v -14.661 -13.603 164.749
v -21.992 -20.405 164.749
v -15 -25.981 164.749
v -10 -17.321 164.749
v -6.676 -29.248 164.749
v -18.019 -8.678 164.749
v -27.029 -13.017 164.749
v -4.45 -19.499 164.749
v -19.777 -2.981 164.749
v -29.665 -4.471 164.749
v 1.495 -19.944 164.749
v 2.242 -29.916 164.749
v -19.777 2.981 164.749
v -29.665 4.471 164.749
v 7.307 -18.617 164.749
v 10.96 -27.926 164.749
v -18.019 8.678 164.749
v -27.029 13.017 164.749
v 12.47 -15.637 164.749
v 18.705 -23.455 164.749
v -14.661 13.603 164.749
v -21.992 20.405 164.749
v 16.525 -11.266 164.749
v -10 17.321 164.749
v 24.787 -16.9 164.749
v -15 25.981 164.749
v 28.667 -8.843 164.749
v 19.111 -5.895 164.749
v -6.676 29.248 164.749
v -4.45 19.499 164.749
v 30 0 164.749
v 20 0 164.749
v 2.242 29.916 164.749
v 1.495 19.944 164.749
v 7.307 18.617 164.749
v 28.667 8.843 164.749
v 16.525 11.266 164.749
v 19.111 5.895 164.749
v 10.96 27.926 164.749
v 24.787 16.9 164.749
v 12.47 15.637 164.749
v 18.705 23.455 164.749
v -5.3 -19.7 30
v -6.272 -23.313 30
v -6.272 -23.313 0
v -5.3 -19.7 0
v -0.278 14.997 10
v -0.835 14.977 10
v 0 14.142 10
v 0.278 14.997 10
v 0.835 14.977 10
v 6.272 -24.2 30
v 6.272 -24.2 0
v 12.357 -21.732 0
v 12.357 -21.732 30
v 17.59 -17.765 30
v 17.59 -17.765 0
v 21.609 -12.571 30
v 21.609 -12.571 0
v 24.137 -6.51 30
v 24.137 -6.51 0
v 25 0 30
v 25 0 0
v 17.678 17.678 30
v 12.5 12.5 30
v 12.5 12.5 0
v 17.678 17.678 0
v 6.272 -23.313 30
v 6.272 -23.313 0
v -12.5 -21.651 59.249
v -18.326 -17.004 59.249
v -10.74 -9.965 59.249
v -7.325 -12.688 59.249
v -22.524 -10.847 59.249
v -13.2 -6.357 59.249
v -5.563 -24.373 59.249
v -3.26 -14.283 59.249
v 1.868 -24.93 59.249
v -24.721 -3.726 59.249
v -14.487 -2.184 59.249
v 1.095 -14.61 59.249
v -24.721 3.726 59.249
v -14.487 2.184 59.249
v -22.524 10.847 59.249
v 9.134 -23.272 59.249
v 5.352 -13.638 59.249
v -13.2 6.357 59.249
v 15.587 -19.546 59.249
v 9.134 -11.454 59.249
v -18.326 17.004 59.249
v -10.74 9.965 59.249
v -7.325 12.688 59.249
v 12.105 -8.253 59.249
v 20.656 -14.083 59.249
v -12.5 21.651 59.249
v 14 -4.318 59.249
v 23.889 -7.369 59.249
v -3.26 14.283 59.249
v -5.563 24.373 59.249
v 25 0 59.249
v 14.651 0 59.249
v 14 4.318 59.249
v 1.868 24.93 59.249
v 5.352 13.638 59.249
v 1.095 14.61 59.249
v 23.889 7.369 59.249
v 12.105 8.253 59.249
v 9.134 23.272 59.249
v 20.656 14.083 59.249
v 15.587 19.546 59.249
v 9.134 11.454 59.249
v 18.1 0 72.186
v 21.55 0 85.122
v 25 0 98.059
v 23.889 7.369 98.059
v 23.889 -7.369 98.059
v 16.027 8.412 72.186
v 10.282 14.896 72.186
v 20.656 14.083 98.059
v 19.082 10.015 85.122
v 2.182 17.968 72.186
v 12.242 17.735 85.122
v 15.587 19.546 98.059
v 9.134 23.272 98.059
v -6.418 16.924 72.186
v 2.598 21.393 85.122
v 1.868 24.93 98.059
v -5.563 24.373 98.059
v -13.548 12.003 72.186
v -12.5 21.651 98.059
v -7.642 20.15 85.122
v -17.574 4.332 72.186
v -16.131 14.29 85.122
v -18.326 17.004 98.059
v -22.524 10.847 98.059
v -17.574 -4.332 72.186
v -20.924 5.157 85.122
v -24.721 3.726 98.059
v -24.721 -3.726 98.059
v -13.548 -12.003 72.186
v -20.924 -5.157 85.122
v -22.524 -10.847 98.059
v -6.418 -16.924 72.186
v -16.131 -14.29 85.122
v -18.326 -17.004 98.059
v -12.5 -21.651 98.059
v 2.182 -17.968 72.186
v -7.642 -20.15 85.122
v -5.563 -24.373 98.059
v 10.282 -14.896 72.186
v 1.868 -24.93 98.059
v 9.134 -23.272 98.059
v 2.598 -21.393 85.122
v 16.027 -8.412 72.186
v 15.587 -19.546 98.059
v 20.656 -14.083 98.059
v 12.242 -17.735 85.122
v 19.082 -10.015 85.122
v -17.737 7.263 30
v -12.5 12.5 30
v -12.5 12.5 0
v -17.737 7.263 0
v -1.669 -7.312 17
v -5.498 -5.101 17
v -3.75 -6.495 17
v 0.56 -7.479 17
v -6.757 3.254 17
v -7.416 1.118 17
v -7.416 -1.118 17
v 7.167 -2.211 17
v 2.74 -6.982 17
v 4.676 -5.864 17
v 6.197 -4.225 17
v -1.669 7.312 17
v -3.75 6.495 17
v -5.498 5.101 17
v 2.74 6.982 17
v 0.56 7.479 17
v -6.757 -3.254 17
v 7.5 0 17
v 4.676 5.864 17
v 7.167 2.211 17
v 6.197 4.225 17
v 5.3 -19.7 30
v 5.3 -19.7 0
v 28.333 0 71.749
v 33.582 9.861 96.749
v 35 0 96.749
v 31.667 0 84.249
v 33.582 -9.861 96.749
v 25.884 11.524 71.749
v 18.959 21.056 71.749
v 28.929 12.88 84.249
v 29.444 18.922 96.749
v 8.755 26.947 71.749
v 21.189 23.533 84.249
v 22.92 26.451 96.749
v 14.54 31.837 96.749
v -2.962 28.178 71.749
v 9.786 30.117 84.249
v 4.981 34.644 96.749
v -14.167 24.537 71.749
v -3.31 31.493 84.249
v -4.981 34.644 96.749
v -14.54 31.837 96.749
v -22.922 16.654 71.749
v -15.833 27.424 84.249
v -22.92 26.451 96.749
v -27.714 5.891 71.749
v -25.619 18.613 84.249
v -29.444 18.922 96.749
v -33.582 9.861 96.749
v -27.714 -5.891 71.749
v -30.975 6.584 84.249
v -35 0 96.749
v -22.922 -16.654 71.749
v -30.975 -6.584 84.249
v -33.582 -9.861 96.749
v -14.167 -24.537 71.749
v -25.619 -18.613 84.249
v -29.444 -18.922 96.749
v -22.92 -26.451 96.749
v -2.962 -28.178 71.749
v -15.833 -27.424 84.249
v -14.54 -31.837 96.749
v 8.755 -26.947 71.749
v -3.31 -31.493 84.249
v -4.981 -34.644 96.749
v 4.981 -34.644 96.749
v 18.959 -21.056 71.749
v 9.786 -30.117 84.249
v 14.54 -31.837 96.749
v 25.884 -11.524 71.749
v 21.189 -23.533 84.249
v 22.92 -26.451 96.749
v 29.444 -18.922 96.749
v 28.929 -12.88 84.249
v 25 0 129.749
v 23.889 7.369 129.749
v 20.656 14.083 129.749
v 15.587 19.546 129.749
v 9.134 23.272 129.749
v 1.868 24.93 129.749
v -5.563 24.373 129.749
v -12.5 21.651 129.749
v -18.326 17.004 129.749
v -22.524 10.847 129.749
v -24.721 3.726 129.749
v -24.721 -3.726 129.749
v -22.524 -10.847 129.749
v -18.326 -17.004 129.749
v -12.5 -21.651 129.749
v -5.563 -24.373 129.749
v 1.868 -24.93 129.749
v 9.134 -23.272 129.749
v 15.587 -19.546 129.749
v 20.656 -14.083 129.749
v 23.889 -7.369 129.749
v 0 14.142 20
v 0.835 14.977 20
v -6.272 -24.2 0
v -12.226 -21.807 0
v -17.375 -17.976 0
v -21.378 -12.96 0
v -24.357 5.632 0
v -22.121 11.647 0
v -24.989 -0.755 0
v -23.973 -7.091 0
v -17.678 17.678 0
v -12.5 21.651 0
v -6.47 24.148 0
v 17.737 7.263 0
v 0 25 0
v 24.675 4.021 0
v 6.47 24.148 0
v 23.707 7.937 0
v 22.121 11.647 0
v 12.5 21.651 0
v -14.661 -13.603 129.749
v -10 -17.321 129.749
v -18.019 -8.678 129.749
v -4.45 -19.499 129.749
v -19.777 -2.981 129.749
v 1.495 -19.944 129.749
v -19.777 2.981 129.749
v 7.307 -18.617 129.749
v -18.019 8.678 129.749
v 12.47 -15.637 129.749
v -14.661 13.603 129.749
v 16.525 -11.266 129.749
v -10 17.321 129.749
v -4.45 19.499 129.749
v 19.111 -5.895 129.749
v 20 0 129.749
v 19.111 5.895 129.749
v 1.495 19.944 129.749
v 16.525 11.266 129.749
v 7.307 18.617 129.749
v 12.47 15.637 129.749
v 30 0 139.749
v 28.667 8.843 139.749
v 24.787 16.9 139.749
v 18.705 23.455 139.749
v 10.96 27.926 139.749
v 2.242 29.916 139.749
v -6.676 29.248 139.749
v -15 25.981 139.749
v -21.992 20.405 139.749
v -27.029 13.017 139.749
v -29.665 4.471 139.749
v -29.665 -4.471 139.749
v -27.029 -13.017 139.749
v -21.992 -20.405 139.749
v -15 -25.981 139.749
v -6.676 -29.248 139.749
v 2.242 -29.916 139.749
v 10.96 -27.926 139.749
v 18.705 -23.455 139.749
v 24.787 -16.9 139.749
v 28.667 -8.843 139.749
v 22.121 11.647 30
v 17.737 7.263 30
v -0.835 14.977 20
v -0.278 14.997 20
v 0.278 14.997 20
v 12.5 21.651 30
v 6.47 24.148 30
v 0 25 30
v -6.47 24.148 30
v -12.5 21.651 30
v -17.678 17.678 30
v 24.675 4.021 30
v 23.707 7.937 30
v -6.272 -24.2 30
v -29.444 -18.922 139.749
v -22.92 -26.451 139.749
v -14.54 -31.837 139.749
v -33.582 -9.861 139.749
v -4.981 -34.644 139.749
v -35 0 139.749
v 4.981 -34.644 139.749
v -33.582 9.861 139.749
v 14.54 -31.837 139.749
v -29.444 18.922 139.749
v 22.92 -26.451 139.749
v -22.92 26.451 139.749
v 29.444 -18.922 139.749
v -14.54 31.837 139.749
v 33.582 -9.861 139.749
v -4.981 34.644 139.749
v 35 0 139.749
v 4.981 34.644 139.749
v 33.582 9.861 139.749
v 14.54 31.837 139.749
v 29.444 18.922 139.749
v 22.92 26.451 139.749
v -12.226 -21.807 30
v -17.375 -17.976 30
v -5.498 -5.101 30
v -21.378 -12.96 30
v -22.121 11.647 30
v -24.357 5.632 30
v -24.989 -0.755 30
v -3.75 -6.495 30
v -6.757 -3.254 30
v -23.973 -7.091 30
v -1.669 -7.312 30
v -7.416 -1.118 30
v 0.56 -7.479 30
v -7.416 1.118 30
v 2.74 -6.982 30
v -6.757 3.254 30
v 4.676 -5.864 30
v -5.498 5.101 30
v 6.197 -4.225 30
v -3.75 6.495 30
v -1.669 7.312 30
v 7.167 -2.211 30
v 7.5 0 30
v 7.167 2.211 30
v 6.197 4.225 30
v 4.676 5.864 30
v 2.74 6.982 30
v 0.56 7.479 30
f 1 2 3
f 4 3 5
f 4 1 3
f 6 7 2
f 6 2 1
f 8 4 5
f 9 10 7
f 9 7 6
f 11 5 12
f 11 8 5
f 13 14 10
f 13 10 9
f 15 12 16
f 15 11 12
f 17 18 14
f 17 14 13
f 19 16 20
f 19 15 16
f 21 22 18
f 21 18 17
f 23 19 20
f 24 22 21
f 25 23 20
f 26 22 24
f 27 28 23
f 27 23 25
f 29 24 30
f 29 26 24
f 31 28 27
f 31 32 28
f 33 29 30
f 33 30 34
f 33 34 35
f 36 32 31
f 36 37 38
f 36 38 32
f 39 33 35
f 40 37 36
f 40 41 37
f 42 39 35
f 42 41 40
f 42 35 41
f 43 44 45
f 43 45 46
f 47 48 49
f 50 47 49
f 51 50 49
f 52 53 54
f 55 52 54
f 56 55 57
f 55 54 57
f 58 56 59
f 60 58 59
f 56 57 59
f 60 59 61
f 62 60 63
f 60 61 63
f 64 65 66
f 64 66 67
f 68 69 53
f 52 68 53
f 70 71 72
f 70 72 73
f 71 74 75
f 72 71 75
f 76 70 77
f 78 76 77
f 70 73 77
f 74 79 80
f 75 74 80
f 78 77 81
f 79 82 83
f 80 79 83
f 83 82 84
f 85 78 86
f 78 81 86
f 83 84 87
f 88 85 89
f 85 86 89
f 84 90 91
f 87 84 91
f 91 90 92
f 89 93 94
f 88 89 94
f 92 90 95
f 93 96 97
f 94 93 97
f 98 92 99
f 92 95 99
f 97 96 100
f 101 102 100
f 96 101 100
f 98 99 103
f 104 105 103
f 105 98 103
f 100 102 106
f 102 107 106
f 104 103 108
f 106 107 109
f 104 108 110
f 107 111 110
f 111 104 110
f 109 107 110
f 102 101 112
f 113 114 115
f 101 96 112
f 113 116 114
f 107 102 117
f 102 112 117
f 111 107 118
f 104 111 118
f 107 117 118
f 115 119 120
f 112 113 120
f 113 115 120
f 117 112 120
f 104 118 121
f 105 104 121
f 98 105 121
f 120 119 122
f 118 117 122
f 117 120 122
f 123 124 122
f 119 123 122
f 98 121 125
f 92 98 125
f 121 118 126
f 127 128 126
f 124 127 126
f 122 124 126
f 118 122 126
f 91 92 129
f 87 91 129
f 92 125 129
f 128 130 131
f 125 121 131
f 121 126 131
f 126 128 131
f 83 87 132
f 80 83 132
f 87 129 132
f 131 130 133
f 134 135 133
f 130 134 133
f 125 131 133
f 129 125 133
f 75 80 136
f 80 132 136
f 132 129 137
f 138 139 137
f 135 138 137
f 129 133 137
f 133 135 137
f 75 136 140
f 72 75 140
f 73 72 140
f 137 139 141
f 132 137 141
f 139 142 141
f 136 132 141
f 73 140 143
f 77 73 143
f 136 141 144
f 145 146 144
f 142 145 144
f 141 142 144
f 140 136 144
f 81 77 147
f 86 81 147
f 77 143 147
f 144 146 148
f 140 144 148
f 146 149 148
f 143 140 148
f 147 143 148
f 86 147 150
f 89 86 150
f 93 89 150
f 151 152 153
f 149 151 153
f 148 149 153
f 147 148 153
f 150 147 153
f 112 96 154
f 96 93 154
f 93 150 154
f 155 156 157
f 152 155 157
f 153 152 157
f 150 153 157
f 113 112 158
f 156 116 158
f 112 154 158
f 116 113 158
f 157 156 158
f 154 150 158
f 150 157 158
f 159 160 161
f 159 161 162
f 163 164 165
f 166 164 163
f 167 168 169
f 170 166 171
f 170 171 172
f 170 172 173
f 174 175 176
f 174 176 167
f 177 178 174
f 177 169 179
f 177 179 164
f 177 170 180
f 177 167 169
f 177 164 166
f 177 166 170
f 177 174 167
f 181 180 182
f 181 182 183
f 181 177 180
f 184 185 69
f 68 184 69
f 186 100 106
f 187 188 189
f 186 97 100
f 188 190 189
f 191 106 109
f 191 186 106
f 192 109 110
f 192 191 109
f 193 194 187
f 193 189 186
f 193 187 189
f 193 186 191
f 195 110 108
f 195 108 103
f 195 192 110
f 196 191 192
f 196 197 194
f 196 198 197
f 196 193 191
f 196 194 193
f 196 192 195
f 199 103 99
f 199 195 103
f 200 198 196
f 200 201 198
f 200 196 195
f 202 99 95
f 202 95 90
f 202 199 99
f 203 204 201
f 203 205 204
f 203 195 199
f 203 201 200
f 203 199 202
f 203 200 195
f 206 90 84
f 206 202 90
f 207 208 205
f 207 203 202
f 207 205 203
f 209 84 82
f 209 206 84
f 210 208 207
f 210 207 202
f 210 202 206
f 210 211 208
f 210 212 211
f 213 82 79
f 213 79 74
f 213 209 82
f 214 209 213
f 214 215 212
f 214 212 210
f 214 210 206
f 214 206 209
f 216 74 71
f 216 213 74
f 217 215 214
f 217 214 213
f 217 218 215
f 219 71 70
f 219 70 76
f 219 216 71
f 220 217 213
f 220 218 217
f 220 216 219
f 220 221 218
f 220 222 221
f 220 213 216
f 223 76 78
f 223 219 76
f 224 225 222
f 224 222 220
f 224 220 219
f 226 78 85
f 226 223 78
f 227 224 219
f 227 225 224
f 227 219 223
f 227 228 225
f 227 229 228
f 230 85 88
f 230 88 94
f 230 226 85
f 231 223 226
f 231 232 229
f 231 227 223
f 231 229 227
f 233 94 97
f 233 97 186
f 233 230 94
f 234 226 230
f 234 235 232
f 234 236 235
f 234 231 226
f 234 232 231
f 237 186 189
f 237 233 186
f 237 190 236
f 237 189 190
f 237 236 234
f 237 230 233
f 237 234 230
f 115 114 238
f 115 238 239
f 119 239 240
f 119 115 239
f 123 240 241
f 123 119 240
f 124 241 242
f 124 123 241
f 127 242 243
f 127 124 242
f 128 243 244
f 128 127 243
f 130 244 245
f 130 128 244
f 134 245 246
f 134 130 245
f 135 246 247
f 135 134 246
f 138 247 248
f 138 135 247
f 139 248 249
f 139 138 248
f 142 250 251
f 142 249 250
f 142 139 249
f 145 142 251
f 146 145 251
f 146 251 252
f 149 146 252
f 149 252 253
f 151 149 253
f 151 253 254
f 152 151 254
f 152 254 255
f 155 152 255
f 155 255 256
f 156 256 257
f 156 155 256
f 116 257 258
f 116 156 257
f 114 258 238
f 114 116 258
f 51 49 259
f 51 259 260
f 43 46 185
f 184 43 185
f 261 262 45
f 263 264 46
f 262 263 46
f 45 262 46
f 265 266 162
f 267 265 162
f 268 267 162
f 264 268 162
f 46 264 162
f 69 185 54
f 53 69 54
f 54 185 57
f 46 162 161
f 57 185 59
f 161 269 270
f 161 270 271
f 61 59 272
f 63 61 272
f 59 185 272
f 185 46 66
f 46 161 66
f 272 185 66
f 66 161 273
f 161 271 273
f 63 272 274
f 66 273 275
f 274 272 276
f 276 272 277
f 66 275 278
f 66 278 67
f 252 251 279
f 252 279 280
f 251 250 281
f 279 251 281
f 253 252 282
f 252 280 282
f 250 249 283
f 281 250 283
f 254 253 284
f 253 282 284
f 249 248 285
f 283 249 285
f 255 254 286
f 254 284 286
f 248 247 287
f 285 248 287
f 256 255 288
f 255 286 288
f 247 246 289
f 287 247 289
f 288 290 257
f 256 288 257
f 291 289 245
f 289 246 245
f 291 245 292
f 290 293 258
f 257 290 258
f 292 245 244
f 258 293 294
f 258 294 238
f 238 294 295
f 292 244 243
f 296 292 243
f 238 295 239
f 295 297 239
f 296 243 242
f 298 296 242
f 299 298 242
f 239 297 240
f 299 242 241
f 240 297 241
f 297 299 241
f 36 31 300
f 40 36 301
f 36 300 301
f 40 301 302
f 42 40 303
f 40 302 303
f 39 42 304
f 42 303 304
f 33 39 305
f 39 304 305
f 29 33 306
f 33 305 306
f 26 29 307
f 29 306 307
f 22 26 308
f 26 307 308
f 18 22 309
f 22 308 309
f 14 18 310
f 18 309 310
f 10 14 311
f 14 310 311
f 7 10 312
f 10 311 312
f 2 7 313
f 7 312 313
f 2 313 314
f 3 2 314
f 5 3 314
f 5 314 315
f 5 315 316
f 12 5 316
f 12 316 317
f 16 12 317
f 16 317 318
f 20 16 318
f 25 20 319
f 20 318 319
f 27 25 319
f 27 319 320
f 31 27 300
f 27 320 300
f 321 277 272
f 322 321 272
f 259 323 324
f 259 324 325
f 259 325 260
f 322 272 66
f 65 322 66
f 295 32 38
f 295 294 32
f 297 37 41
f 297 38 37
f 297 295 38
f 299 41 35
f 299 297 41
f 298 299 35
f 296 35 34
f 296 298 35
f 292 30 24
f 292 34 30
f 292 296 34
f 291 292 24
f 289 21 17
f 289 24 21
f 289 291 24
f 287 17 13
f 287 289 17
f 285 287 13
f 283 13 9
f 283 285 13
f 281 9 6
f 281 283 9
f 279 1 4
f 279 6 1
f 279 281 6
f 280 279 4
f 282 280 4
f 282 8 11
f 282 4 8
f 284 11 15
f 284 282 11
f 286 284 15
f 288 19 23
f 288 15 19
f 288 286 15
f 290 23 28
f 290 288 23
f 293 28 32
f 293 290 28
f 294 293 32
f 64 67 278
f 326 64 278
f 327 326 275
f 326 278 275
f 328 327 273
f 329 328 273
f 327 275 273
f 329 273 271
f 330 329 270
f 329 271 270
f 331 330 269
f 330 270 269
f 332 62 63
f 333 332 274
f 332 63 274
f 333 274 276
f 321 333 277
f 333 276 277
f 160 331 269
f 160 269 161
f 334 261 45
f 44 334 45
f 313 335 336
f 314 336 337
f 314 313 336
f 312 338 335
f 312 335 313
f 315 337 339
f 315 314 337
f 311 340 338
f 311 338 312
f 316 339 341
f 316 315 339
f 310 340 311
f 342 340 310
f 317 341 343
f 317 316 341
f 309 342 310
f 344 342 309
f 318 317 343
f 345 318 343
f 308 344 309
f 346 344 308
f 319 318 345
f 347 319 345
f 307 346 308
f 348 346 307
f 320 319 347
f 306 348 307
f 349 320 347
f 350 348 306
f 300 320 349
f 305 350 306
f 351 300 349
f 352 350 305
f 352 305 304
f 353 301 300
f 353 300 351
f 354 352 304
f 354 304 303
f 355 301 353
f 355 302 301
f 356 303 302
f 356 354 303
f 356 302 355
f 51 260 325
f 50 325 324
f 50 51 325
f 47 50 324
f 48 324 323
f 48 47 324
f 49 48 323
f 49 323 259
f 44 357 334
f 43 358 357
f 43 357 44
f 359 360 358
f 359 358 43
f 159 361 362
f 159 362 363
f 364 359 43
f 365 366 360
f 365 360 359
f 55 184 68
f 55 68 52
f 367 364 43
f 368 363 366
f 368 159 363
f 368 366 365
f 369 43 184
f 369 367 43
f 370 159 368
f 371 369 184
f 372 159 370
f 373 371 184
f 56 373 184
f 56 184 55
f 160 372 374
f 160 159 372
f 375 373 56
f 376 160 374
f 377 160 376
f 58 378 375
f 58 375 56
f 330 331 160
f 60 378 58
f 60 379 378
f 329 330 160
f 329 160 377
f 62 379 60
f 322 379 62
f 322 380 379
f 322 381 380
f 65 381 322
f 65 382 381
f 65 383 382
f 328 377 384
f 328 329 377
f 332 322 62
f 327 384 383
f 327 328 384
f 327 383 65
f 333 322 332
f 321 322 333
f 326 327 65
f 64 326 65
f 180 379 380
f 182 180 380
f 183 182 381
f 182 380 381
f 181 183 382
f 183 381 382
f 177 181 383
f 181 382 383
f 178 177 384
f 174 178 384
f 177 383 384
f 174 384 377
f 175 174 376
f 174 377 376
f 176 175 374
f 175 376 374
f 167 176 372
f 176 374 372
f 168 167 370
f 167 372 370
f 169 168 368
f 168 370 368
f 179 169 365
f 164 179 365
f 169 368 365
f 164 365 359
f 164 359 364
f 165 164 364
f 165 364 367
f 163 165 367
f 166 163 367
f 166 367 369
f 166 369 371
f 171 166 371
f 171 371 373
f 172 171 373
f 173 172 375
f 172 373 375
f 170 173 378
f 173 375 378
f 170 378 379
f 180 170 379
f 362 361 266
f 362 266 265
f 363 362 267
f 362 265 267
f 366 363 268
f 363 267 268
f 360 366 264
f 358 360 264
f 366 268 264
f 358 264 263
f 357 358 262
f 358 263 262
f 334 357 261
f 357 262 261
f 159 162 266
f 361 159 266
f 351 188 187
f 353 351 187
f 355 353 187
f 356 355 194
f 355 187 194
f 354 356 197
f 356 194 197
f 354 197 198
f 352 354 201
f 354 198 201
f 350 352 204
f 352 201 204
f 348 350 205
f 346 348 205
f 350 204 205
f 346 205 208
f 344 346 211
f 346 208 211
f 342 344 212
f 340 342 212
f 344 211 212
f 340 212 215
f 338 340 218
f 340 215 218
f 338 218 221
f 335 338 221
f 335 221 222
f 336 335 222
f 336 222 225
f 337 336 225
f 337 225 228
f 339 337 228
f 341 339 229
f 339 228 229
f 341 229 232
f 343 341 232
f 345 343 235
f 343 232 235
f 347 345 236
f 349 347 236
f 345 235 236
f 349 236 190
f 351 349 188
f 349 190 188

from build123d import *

# Parameters (mm, degrees)
BOSS_EXTRUDE2_DEPTH = 30
SKETCH2_R           = 7.5
CUT_EXTRUDE1_DEPTH  = 13
SKETCH5_R           = 25
SKETCH7_R           = 35
SKETCH10_R          = 35
BOSS_EXTRUDE3_DEPTH = 43
SKETCH11_R          = 30
BOSS_EXTRUDE4_DEPTH = 25
SHELL4_T            = -10
SHELL5_START        = 10
SHELL5_DEPTH        = 10


# Read off the part's stored shape, not the designer's step: Shell5
with BuildPart() as part:
    # Sketch1 → Boss-Extrude2 (new body)
    with BuildSketch(Plane.XY):
        with BuildLine():
            Line((-17.67766953, 17.67766953), (-12.5, 12.5))
            Line((-12.5, 12.5), (-17.737217669, 7.262782331))
            Line((-17.737217669, 7.262782331), (-22.121279713, 11.646844374))
            ThreePointArc((-22.121279713, 11.646844374), (-22.864843942, -10.10934773), (-6.271925609, -24.200474151))
            Line((-6.271925609, -24.200474151), (-6.271925609, -23.312629151))
            Line((-6.271925609, -23.312629151), (-5.3, -19.7))
            Line((-5.3, -19.7), (0, -19.7))
            Line((0, -19.7), (5.3, -19.7))
            Line((5.3, -19.7), (6.271925609, -23.312629151))
            Line((6.271925609, -23.312629151), (6.271925609, -24.200474151))
            ThreePointArc((6.271925609, -24.200474151), (19.771167647, -15.300357182), (25, 0))
            ThreePointArc((25, 0), (24.269651757, 5.998666818), (22.121279713, 11.646844374))
            Line((22.121279713, 11.646844374), (17.737217669, 7.262782331))
            Line((17.737217669, 7.262782331), (12.5, 12.5))
            Line((12.5, 12.5), (17.67766953, 17.67766953))
            ThreePointArc((17.67766953, 17.67766953), (0, 25), (-17.67766953, 17.67766953))
        make_face()
    extrude(amount=BOSS_EXTRUDE2_DEPTH)

    # Sketch2 → Cut-Extrude1 (cut)
    with BuildSketch(Plane.XY.offset(30)):
        Circle(SKETCH2_R)
    extrude(amount=-CUT_EXTRUDE1_DEPTH, mode=Mode.SUBTRACT)

    # Shell5 outline → Shell5 (cut)
    with BuildSketch(Plane.XY.offset(SHELL5_START)):
        with BuildLine():
            Line((0, 14.142135624), (0.834626339, 14.976761962))
            ThreePointArc((0.834626339, 14.976761962), (0, 15), (-0.834626339, 14.976761962))
            Line((-0.834626339, 14.976761962), (0, 14.142135624))
        make_face()
    extrude(amount=SHELL5_DEPTH, mode=Mode.SUBTRACT)


with BuildPart() as body_2:
    # Sketch5 → Loft1 section 0
    with BuildSketch(Plane.XY.offset(59.248809309)):
        Circle(SKETCH5_R)
    # Sketch7 → Loft1 section 1
    with BuildSketch(Plane.XY.offset(96.748809309)):
        Circle(SKETCH7_R)
    loft()

    # Sketch10 → Boss-Extrude3 (add)
    with BuildSketch(Plane.XY.offset(96.748809309)):
        Circle(SKETCH10_R)
    extrude(amount=BOSS_EXTRUDE3_DEPTH)

    # Sketch11 → Boss-Extrude4 (add)
    with BuildSketch(Plane.XY.offset(139.748809309)):
        Circle(SKETCH11_R)
    extrude(amount=BOSS_EXTRUDE4_DEPTH)

    # Shell4
    shell4_openings = [body_2.faces().sort_by_distance(p)[0] for p in [
        (0, 0, 164.748809309),
        (0, 0, 59.248809309),
    ]]
    offset(amount=SHELL4_T, openings=shell4_openings, kind=Kind.INTERSECTION)


solid = Compound([part.part, body_2.part])
